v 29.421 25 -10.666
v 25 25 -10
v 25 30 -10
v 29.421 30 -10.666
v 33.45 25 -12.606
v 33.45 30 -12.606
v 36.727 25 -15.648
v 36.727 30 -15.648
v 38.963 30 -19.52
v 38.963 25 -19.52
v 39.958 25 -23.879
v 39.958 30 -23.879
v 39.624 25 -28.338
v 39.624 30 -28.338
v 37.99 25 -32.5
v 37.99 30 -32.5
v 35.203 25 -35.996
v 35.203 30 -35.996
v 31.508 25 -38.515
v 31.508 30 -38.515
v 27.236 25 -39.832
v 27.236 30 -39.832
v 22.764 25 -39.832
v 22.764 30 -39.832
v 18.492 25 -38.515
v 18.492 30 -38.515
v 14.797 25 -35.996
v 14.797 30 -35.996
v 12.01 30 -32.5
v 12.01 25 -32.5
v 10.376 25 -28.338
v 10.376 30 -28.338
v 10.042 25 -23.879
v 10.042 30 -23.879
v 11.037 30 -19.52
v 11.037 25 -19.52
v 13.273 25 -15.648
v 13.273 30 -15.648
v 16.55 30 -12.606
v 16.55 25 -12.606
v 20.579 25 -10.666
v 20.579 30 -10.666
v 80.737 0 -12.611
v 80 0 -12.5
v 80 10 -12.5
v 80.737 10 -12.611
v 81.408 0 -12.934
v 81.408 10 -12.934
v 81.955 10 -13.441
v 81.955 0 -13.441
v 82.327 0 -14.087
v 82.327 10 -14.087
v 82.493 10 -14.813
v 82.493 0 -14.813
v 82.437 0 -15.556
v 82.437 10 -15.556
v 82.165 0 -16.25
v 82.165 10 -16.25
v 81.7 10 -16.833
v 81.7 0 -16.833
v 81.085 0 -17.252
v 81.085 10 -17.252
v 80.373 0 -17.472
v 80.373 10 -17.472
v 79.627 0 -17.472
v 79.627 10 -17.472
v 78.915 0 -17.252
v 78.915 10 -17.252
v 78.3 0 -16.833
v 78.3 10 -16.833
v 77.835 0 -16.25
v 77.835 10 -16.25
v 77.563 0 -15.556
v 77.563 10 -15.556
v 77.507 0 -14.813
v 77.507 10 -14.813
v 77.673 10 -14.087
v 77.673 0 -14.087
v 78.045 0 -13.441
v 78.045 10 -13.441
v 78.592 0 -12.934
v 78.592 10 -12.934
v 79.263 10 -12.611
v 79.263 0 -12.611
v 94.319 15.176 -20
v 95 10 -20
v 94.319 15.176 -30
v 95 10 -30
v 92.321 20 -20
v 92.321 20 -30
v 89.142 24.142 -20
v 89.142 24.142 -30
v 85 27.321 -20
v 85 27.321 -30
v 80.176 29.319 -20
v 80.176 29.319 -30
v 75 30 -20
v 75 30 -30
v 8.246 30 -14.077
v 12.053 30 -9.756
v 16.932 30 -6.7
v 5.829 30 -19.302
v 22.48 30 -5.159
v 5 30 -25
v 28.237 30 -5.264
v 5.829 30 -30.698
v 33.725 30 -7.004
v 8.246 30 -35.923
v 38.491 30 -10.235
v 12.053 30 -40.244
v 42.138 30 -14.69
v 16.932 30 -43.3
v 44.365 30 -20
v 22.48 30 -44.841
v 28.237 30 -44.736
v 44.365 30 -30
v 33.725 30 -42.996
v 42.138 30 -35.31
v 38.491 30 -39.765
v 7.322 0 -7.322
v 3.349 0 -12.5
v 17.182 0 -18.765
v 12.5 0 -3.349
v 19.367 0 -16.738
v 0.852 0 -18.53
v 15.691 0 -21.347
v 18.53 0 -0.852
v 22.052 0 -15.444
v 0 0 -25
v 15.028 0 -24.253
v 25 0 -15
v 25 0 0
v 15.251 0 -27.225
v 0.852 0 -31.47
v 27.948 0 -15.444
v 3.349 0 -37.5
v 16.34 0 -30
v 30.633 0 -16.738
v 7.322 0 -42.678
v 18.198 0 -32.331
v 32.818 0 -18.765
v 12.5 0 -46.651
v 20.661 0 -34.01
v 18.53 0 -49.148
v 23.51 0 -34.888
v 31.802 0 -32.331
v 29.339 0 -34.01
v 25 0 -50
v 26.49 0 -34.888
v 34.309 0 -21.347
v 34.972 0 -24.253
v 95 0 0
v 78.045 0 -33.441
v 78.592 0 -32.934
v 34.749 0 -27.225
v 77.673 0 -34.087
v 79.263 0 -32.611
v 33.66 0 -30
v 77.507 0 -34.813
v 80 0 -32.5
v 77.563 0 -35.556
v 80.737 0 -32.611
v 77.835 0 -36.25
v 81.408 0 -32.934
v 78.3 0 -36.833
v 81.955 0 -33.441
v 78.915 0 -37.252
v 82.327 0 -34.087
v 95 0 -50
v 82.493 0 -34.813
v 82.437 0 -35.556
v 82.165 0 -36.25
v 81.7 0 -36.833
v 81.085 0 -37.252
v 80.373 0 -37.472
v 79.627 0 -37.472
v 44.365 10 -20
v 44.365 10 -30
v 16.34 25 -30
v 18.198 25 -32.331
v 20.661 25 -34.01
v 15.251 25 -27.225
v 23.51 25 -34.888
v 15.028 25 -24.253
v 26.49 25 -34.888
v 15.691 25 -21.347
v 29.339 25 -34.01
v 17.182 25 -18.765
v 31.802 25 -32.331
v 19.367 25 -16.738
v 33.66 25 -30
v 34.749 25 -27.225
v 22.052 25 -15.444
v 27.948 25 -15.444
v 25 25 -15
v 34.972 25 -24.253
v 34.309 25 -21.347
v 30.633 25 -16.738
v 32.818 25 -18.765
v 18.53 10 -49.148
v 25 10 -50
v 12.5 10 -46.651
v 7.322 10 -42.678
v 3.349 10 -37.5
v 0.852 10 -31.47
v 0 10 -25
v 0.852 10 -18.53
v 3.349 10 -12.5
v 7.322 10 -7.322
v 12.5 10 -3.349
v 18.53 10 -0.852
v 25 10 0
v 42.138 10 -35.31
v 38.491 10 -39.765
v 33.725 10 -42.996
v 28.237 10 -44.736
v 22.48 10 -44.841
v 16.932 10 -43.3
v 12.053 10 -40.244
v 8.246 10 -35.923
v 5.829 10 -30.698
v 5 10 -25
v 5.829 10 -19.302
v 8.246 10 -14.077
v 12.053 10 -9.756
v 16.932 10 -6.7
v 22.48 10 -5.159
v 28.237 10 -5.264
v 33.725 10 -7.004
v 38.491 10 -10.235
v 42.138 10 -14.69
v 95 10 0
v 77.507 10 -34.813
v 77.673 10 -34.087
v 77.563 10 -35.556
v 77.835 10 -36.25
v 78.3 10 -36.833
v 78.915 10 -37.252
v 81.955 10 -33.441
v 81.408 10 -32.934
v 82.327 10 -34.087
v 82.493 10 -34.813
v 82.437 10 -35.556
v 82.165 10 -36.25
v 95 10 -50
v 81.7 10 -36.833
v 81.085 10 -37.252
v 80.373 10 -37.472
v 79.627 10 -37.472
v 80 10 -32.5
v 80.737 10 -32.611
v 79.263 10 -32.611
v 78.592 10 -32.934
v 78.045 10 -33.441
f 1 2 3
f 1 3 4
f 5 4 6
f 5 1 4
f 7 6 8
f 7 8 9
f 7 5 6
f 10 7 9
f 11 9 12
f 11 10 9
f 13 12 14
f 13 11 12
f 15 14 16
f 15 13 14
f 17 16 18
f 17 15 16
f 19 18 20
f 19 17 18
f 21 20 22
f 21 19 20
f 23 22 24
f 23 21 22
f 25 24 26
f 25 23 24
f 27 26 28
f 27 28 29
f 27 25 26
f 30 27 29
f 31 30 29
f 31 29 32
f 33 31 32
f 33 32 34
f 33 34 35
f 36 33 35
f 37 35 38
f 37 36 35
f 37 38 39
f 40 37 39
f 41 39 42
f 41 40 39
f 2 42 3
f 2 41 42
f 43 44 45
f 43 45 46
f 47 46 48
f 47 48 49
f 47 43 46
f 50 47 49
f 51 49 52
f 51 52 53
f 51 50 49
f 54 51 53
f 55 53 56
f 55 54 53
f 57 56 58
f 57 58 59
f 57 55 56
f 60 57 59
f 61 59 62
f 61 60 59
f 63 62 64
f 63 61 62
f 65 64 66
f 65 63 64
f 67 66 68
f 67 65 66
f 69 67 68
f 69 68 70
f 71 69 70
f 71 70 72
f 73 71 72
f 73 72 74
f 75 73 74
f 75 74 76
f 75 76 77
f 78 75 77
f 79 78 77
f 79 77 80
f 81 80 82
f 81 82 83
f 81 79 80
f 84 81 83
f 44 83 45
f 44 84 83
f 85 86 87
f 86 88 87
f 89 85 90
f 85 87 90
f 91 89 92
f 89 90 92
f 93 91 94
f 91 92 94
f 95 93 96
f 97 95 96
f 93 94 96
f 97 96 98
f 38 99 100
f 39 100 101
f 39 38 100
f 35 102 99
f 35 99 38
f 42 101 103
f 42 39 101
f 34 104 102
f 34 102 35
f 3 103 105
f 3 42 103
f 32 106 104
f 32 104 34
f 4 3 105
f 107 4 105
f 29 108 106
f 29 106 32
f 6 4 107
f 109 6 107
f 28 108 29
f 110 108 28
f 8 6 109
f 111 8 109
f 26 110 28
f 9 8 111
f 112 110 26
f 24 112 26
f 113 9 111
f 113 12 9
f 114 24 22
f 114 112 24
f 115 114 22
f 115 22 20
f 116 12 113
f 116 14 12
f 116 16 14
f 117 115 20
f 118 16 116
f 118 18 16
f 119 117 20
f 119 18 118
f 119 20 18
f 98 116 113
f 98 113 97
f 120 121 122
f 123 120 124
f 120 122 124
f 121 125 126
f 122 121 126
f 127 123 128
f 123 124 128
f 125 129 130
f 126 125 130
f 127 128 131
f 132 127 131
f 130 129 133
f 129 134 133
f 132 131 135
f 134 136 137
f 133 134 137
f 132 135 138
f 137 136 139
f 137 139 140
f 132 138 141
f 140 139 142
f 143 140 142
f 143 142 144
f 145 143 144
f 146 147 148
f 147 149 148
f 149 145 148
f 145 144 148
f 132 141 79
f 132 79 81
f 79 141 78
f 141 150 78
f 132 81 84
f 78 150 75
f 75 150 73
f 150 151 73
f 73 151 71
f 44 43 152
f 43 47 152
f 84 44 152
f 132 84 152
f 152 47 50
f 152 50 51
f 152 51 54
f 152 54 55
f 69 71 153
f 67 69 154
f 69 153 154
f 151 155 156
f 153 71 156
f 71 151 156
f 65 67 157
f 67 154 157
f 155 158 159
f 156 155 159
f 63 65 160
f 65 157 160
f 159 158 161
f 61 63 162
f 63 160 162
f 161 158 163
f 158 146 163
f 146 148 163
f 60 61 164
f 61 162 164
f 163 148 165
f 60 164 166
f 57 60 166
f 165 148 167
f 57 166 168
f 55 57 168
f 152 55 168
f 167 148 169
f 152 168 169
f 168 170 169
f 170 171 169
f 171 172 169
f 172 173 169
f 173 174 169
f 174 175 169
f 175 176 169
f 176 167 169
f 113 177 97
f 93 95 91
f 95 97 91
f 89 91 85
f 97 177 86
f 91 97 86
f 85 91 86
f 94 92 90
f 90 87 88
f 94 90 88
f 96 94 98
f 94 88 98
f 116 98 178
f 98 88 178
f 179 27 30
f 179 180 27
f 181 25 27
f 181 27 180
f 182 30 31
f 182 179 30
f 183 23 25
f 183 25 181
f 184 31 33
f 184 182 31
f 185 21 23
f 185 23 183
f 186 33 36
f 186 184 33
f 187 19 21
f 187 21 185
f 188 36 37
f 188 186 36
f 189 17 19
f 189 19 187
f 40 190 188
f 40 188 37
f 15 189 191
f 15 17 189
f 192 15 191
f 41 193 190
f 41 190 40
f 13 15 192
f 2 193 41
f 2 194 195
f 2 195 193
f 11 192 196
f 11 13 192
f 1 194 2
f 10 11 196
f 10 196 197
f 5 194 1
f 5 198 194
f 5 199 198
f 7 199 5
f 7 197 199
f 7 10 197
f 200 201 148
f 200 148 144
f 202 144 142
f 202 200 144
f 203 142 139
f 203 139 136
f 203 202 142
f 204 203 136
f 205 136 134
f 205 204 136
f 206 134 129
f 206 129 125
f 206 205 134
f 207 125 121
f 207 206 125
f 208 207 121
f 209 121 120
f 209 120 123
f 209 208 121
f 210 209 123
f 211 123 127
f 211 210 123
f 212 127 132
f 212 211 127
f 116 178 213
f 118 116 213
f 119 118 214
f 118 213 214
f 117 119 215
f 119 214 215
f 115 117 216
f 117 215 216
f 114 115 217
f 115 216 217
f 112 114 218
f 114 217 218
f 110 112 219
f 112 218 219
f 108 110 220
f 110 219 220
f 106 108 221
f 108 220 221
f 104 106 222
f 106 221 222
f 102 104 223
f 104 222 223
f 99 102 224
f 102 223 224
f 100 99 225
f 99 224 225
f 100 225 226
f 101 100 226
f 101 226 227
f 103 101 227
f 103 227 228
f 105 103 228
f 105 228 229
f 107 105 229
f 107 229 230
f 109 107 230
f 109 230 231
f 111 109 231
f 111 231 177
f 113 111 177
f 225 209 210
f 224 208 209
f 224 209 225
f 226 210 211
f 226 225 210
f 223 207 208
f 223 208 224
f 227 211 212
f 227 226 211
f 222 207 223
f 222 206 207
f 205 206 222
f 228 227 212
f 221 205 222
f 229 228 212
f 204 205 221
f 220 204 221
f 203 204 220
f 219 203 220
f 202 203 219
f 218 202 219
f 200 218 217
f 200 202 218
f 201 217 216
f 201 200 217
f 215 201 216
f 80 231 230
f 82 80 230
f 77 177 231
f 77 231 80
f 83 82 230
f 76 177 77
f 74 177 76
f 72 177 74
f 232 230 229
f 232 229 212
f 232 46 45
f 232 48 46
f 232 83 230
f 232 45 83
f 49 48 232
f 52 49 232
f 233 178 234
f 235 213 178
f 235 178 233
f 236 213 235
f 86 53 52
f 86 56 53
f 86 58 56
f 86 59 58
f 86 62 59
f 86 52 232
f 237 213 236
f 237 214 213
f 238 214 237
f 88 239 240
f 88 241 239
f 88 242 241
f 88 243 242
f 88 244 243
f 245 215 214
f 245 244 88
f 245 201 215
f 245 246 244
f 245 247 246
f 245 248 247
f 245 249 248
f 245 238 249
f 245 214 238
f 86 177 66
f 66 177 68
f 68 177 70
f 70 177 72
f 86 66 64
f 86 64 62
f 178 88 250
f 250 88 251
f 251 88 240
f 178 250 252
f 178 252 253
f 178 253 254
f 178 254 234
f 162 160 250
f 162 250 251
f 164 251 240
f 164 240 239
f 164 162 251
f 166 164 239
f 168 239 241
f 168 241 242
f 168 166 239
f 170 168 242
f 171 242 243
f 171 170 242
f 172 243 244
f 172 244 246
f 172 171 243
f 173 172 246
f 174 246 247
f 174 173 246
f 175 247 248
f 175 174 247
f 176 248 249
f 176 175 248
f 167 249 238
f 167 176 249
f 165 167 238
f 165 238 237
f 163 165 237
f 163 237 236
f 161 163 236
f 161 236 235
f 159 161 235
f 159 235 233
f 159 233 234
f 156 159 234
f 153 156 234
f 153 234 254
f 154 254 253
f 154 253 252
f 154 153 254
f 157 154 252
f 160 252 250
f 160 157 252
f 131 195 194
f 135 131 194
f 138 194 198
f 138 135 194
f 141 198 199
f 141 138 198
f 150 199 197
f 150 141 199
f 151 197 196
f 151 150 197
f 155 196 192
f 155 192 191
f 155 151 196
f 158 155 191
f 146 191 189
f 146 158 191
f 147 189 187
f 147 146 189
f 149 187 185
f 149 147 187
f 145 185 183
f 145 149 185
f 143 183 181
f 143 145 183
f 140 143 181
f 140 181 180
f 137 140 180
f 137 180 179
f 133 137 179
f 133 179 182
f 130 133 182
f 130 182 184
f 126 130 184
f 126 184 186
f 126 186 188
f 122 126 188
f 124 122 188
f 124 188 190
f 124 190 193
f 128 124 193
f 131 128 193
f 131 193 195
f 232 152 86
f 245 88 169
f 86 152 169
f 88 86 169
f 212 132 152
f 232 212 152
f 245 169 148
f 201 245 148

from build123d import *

# Parameters (mm, degrees)
SKETCH10_R          = 2.5
BOSS_EXTRUDE3_DEPTH = 10
SKETCH10_3_R        = 15
SKETCH10_3_R_2      = 10
BOSS_EXTRUDE4_DEPTH = 30
FILLET1_RADIUS      = 25
FILLET1_LENGTH      = 10
FILLET2_R           = 20
CUT_EXTRUDE1_START  = 25
SKETCH10_6_R        = 15
SKETCH10_6_R_2      = 10
CUT_EXTRUDE1_DEPTH  = 5


with BuildPart() as part:
    # Sketch10 → Boss-Extrude3 (new body)
    with BuildSketch(Plane(origin=(0, 0, 0), x_dir=(1, 0, 0), z_dir=(0, 1, 0))):
        with BuildLine():
            ThreePointArc((44.364916731, 20), (5, 25), (44.364916731, 30))
            Line((44.364916731, 30), (95, 30))
            Line((95, 30), (95, 50))
            Line((95, 50), (0, 50))
            Line((0, 50), (0, 0))
            Line((0, 0), (95, 0))
            Line((95, 0), (95, 20))
            Line((95, 20), (44.364916731, 20))
        make_face()
        with Locations(Location((80, 15, 0), (0, 0, 270))):
            Circle(SKETCH10_R, mode=Mode.SUBTRACT)
        with Locations(Location((80, 35, 0), (0, 0, 270))):
            Circle(SKETCH10_R, mode=Mode.SUBTRACT)
    extrude(amount=BOSS_EXTRUDE3_DEPTH)

    # Sketch10<3> → Boss-Extrude4 (add)
    # profile 1 of 2: a face of its own
    with BuildSketch(Plane(origin=(0, 0, 0), x_dir=(1, 0, 0), z_dir=(0, 1, 0))):
        with BuildLine():
            Line((95, 30), (44.364916731, 30))
            ThreePointArc((44.364916731, 30), (5, 25), (44.364916731, 20))
            Line((44.364916731, 20), (95, 20))
            Line((95, 20), (95, 30))
        make_face()
        with Locations((25, 25)):
            Circle(SKETCH10_3_R, mode=Mode.SUBTRACT)
    # profile 2 of 2: a face of its own
    with BuildSketch(Plane(origin=(0, 0, 0), x_dir=(1, 0, 0), z_dir=(0, 1, 0))):
        with Locations((25, 25)):
            Circle(SKETCH10_3_R)
        with Locations(Location((25, 25, 0), (0, 0, 270))):
            Circle(SKETCH10_3_R_2, mode=Mode.SUBTRACT)
    extrude(amount=BOSS_EXTRUDE4_DEPTH)

    # Fillet1: full round fillet: the end face becomes a half cylinder, R = half its width
    fillet1_face = Plane((0, 5, -25), x_dir=(0, 1, 0), z_dir=(-1, 0, 0))  # on the end face: x along it, z out of the body
    fillet1_slab = fillet1_face.offset(-FILLET1_RADIUS / 2) * Box(FILLET1_LENGTH, 2 * FILLET1_RADIUS, FILLET1_RADIUS, mode=Mode.PRIVATE)  # the body's end, R deep
    fillet1_round = Plane((25, 5, -25), x_dir=(-1, 0, 0), z_dir=(0, 1, 0)) * Cylinder(FILLET1_RADIUS, FILLET1_LENGTH, mode=Mode.PRIVATE)  # its axis R under the face
    add(fillet1_slab - fillet1_round, mode=Mode.SUBTRACT)

    # Fillet2
    fillet2_edges = [part.edges().sort_by_distance(p)[0] for p in [
        (95, 30, -25),
    ]]
    fillet(fillet2_edges, radius=FILLET2_R)

    # Sketch10<6> → Cut-Extrude1 (cut)
    with BuildSketch(Plane(origin=(0, 0, 0), x_dir=(1, 0, 0), z_dir=(0, 1, 0)).offset(CUT_EXTRUDE1_START)):
        with Locations(Location((25, 25, 0), (0, 0, 270))):
            Circle(SKETCH10_6_R)
        with Locations(Location((25, 25, 0), (0, 0, 270))):
            Circle(SKETCH10_6_R_2, mode=Mode.SUBTRACT)
    extrude(amount=CUT_EXTRUDE1_DEPTH, mode=Mode.SUBTRACT)


solid = part.part
